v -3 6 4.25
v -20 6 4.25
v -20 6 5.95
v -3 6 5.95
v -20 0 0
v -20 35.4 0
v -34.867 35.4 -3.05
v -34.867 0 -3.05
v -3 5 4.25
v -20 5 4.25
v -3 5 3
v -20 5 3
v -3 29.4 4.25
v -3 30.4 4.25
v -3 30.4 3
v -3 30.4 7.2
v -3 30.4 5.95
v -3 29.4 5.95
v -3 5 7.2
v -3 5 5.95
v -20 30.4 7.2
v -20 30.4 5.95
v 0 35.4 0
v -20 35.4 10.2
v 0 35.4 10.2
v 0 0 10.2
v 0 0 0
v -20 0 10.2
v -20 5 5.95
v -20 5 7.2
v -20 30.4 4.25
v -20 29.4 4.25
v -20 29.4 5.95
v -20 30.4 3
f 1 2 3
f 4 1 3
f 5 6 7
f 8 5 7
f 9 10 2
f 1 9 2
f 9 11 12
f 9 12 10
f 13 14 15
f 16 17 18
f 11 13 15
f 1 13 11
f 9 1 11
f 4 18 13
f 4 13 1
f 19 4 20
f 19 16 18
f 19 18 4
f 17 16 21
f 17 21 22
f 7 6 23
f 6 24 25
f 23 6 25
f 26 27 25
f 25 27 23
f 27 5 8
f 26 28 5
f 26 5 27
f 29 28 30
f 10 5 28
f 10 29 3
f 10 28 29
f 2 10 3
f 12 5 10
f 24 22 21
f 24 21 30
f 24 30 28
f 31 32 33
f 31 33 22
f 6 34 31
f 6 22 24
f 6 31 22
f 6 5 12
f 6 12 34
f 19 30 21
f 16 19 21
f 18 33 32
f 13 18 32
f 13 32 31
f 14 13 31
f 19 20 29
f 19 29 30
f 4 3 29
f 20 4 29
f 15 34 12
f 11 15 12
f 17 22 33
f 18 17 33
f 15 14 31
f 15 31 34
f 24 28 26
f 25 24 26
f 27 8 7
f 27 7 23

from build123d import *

# Parameters (mm, degrees)
F0_W     = 20
F0_H     = 35.4
F1_DEPTH = 10.2
F3_DEPTH = 17
F5_DEPTH = 35.4


with BuildPart() as f1:
    # F0 (on Top) → F1 (new body)
    with BuildSketch(Plane.XY):
        with Locations((-10, 17.7)):
            Rectangle(F0_W, F0_H)
    extrude(amount=F1_DEPTH)

    # F2 (on face) → F3 (cut)
    with BuildSketch(Plane(origin=(-20, 0, 0), x_dir=(0, -1, 0), z_dir=(-1, 0, 0))):
        Polygon((-5, 5.95), (-5, 7.2), (-30.4, 7.2), (-30.4, 5.95), (-29.4, 5.95), (-29.4, 4.25), (-30.4, 4.25), (-30.4, 3), (-5, 3), (-5, 4.25), (-6, 4.25), (-6, 5.95), align=None)
    extrude(amount=-F3_DEPTH, mode=Mode.SUBTRACT)

    # F4 (on face) → F5 (join)
    with BuildSketch(Plane.XZ):
        Polygon((-34.866854, -3.05), (0, 0), (-20, 0), align=None)
    extrude(amount=-F5_DEPTH)


solid = f1.part
